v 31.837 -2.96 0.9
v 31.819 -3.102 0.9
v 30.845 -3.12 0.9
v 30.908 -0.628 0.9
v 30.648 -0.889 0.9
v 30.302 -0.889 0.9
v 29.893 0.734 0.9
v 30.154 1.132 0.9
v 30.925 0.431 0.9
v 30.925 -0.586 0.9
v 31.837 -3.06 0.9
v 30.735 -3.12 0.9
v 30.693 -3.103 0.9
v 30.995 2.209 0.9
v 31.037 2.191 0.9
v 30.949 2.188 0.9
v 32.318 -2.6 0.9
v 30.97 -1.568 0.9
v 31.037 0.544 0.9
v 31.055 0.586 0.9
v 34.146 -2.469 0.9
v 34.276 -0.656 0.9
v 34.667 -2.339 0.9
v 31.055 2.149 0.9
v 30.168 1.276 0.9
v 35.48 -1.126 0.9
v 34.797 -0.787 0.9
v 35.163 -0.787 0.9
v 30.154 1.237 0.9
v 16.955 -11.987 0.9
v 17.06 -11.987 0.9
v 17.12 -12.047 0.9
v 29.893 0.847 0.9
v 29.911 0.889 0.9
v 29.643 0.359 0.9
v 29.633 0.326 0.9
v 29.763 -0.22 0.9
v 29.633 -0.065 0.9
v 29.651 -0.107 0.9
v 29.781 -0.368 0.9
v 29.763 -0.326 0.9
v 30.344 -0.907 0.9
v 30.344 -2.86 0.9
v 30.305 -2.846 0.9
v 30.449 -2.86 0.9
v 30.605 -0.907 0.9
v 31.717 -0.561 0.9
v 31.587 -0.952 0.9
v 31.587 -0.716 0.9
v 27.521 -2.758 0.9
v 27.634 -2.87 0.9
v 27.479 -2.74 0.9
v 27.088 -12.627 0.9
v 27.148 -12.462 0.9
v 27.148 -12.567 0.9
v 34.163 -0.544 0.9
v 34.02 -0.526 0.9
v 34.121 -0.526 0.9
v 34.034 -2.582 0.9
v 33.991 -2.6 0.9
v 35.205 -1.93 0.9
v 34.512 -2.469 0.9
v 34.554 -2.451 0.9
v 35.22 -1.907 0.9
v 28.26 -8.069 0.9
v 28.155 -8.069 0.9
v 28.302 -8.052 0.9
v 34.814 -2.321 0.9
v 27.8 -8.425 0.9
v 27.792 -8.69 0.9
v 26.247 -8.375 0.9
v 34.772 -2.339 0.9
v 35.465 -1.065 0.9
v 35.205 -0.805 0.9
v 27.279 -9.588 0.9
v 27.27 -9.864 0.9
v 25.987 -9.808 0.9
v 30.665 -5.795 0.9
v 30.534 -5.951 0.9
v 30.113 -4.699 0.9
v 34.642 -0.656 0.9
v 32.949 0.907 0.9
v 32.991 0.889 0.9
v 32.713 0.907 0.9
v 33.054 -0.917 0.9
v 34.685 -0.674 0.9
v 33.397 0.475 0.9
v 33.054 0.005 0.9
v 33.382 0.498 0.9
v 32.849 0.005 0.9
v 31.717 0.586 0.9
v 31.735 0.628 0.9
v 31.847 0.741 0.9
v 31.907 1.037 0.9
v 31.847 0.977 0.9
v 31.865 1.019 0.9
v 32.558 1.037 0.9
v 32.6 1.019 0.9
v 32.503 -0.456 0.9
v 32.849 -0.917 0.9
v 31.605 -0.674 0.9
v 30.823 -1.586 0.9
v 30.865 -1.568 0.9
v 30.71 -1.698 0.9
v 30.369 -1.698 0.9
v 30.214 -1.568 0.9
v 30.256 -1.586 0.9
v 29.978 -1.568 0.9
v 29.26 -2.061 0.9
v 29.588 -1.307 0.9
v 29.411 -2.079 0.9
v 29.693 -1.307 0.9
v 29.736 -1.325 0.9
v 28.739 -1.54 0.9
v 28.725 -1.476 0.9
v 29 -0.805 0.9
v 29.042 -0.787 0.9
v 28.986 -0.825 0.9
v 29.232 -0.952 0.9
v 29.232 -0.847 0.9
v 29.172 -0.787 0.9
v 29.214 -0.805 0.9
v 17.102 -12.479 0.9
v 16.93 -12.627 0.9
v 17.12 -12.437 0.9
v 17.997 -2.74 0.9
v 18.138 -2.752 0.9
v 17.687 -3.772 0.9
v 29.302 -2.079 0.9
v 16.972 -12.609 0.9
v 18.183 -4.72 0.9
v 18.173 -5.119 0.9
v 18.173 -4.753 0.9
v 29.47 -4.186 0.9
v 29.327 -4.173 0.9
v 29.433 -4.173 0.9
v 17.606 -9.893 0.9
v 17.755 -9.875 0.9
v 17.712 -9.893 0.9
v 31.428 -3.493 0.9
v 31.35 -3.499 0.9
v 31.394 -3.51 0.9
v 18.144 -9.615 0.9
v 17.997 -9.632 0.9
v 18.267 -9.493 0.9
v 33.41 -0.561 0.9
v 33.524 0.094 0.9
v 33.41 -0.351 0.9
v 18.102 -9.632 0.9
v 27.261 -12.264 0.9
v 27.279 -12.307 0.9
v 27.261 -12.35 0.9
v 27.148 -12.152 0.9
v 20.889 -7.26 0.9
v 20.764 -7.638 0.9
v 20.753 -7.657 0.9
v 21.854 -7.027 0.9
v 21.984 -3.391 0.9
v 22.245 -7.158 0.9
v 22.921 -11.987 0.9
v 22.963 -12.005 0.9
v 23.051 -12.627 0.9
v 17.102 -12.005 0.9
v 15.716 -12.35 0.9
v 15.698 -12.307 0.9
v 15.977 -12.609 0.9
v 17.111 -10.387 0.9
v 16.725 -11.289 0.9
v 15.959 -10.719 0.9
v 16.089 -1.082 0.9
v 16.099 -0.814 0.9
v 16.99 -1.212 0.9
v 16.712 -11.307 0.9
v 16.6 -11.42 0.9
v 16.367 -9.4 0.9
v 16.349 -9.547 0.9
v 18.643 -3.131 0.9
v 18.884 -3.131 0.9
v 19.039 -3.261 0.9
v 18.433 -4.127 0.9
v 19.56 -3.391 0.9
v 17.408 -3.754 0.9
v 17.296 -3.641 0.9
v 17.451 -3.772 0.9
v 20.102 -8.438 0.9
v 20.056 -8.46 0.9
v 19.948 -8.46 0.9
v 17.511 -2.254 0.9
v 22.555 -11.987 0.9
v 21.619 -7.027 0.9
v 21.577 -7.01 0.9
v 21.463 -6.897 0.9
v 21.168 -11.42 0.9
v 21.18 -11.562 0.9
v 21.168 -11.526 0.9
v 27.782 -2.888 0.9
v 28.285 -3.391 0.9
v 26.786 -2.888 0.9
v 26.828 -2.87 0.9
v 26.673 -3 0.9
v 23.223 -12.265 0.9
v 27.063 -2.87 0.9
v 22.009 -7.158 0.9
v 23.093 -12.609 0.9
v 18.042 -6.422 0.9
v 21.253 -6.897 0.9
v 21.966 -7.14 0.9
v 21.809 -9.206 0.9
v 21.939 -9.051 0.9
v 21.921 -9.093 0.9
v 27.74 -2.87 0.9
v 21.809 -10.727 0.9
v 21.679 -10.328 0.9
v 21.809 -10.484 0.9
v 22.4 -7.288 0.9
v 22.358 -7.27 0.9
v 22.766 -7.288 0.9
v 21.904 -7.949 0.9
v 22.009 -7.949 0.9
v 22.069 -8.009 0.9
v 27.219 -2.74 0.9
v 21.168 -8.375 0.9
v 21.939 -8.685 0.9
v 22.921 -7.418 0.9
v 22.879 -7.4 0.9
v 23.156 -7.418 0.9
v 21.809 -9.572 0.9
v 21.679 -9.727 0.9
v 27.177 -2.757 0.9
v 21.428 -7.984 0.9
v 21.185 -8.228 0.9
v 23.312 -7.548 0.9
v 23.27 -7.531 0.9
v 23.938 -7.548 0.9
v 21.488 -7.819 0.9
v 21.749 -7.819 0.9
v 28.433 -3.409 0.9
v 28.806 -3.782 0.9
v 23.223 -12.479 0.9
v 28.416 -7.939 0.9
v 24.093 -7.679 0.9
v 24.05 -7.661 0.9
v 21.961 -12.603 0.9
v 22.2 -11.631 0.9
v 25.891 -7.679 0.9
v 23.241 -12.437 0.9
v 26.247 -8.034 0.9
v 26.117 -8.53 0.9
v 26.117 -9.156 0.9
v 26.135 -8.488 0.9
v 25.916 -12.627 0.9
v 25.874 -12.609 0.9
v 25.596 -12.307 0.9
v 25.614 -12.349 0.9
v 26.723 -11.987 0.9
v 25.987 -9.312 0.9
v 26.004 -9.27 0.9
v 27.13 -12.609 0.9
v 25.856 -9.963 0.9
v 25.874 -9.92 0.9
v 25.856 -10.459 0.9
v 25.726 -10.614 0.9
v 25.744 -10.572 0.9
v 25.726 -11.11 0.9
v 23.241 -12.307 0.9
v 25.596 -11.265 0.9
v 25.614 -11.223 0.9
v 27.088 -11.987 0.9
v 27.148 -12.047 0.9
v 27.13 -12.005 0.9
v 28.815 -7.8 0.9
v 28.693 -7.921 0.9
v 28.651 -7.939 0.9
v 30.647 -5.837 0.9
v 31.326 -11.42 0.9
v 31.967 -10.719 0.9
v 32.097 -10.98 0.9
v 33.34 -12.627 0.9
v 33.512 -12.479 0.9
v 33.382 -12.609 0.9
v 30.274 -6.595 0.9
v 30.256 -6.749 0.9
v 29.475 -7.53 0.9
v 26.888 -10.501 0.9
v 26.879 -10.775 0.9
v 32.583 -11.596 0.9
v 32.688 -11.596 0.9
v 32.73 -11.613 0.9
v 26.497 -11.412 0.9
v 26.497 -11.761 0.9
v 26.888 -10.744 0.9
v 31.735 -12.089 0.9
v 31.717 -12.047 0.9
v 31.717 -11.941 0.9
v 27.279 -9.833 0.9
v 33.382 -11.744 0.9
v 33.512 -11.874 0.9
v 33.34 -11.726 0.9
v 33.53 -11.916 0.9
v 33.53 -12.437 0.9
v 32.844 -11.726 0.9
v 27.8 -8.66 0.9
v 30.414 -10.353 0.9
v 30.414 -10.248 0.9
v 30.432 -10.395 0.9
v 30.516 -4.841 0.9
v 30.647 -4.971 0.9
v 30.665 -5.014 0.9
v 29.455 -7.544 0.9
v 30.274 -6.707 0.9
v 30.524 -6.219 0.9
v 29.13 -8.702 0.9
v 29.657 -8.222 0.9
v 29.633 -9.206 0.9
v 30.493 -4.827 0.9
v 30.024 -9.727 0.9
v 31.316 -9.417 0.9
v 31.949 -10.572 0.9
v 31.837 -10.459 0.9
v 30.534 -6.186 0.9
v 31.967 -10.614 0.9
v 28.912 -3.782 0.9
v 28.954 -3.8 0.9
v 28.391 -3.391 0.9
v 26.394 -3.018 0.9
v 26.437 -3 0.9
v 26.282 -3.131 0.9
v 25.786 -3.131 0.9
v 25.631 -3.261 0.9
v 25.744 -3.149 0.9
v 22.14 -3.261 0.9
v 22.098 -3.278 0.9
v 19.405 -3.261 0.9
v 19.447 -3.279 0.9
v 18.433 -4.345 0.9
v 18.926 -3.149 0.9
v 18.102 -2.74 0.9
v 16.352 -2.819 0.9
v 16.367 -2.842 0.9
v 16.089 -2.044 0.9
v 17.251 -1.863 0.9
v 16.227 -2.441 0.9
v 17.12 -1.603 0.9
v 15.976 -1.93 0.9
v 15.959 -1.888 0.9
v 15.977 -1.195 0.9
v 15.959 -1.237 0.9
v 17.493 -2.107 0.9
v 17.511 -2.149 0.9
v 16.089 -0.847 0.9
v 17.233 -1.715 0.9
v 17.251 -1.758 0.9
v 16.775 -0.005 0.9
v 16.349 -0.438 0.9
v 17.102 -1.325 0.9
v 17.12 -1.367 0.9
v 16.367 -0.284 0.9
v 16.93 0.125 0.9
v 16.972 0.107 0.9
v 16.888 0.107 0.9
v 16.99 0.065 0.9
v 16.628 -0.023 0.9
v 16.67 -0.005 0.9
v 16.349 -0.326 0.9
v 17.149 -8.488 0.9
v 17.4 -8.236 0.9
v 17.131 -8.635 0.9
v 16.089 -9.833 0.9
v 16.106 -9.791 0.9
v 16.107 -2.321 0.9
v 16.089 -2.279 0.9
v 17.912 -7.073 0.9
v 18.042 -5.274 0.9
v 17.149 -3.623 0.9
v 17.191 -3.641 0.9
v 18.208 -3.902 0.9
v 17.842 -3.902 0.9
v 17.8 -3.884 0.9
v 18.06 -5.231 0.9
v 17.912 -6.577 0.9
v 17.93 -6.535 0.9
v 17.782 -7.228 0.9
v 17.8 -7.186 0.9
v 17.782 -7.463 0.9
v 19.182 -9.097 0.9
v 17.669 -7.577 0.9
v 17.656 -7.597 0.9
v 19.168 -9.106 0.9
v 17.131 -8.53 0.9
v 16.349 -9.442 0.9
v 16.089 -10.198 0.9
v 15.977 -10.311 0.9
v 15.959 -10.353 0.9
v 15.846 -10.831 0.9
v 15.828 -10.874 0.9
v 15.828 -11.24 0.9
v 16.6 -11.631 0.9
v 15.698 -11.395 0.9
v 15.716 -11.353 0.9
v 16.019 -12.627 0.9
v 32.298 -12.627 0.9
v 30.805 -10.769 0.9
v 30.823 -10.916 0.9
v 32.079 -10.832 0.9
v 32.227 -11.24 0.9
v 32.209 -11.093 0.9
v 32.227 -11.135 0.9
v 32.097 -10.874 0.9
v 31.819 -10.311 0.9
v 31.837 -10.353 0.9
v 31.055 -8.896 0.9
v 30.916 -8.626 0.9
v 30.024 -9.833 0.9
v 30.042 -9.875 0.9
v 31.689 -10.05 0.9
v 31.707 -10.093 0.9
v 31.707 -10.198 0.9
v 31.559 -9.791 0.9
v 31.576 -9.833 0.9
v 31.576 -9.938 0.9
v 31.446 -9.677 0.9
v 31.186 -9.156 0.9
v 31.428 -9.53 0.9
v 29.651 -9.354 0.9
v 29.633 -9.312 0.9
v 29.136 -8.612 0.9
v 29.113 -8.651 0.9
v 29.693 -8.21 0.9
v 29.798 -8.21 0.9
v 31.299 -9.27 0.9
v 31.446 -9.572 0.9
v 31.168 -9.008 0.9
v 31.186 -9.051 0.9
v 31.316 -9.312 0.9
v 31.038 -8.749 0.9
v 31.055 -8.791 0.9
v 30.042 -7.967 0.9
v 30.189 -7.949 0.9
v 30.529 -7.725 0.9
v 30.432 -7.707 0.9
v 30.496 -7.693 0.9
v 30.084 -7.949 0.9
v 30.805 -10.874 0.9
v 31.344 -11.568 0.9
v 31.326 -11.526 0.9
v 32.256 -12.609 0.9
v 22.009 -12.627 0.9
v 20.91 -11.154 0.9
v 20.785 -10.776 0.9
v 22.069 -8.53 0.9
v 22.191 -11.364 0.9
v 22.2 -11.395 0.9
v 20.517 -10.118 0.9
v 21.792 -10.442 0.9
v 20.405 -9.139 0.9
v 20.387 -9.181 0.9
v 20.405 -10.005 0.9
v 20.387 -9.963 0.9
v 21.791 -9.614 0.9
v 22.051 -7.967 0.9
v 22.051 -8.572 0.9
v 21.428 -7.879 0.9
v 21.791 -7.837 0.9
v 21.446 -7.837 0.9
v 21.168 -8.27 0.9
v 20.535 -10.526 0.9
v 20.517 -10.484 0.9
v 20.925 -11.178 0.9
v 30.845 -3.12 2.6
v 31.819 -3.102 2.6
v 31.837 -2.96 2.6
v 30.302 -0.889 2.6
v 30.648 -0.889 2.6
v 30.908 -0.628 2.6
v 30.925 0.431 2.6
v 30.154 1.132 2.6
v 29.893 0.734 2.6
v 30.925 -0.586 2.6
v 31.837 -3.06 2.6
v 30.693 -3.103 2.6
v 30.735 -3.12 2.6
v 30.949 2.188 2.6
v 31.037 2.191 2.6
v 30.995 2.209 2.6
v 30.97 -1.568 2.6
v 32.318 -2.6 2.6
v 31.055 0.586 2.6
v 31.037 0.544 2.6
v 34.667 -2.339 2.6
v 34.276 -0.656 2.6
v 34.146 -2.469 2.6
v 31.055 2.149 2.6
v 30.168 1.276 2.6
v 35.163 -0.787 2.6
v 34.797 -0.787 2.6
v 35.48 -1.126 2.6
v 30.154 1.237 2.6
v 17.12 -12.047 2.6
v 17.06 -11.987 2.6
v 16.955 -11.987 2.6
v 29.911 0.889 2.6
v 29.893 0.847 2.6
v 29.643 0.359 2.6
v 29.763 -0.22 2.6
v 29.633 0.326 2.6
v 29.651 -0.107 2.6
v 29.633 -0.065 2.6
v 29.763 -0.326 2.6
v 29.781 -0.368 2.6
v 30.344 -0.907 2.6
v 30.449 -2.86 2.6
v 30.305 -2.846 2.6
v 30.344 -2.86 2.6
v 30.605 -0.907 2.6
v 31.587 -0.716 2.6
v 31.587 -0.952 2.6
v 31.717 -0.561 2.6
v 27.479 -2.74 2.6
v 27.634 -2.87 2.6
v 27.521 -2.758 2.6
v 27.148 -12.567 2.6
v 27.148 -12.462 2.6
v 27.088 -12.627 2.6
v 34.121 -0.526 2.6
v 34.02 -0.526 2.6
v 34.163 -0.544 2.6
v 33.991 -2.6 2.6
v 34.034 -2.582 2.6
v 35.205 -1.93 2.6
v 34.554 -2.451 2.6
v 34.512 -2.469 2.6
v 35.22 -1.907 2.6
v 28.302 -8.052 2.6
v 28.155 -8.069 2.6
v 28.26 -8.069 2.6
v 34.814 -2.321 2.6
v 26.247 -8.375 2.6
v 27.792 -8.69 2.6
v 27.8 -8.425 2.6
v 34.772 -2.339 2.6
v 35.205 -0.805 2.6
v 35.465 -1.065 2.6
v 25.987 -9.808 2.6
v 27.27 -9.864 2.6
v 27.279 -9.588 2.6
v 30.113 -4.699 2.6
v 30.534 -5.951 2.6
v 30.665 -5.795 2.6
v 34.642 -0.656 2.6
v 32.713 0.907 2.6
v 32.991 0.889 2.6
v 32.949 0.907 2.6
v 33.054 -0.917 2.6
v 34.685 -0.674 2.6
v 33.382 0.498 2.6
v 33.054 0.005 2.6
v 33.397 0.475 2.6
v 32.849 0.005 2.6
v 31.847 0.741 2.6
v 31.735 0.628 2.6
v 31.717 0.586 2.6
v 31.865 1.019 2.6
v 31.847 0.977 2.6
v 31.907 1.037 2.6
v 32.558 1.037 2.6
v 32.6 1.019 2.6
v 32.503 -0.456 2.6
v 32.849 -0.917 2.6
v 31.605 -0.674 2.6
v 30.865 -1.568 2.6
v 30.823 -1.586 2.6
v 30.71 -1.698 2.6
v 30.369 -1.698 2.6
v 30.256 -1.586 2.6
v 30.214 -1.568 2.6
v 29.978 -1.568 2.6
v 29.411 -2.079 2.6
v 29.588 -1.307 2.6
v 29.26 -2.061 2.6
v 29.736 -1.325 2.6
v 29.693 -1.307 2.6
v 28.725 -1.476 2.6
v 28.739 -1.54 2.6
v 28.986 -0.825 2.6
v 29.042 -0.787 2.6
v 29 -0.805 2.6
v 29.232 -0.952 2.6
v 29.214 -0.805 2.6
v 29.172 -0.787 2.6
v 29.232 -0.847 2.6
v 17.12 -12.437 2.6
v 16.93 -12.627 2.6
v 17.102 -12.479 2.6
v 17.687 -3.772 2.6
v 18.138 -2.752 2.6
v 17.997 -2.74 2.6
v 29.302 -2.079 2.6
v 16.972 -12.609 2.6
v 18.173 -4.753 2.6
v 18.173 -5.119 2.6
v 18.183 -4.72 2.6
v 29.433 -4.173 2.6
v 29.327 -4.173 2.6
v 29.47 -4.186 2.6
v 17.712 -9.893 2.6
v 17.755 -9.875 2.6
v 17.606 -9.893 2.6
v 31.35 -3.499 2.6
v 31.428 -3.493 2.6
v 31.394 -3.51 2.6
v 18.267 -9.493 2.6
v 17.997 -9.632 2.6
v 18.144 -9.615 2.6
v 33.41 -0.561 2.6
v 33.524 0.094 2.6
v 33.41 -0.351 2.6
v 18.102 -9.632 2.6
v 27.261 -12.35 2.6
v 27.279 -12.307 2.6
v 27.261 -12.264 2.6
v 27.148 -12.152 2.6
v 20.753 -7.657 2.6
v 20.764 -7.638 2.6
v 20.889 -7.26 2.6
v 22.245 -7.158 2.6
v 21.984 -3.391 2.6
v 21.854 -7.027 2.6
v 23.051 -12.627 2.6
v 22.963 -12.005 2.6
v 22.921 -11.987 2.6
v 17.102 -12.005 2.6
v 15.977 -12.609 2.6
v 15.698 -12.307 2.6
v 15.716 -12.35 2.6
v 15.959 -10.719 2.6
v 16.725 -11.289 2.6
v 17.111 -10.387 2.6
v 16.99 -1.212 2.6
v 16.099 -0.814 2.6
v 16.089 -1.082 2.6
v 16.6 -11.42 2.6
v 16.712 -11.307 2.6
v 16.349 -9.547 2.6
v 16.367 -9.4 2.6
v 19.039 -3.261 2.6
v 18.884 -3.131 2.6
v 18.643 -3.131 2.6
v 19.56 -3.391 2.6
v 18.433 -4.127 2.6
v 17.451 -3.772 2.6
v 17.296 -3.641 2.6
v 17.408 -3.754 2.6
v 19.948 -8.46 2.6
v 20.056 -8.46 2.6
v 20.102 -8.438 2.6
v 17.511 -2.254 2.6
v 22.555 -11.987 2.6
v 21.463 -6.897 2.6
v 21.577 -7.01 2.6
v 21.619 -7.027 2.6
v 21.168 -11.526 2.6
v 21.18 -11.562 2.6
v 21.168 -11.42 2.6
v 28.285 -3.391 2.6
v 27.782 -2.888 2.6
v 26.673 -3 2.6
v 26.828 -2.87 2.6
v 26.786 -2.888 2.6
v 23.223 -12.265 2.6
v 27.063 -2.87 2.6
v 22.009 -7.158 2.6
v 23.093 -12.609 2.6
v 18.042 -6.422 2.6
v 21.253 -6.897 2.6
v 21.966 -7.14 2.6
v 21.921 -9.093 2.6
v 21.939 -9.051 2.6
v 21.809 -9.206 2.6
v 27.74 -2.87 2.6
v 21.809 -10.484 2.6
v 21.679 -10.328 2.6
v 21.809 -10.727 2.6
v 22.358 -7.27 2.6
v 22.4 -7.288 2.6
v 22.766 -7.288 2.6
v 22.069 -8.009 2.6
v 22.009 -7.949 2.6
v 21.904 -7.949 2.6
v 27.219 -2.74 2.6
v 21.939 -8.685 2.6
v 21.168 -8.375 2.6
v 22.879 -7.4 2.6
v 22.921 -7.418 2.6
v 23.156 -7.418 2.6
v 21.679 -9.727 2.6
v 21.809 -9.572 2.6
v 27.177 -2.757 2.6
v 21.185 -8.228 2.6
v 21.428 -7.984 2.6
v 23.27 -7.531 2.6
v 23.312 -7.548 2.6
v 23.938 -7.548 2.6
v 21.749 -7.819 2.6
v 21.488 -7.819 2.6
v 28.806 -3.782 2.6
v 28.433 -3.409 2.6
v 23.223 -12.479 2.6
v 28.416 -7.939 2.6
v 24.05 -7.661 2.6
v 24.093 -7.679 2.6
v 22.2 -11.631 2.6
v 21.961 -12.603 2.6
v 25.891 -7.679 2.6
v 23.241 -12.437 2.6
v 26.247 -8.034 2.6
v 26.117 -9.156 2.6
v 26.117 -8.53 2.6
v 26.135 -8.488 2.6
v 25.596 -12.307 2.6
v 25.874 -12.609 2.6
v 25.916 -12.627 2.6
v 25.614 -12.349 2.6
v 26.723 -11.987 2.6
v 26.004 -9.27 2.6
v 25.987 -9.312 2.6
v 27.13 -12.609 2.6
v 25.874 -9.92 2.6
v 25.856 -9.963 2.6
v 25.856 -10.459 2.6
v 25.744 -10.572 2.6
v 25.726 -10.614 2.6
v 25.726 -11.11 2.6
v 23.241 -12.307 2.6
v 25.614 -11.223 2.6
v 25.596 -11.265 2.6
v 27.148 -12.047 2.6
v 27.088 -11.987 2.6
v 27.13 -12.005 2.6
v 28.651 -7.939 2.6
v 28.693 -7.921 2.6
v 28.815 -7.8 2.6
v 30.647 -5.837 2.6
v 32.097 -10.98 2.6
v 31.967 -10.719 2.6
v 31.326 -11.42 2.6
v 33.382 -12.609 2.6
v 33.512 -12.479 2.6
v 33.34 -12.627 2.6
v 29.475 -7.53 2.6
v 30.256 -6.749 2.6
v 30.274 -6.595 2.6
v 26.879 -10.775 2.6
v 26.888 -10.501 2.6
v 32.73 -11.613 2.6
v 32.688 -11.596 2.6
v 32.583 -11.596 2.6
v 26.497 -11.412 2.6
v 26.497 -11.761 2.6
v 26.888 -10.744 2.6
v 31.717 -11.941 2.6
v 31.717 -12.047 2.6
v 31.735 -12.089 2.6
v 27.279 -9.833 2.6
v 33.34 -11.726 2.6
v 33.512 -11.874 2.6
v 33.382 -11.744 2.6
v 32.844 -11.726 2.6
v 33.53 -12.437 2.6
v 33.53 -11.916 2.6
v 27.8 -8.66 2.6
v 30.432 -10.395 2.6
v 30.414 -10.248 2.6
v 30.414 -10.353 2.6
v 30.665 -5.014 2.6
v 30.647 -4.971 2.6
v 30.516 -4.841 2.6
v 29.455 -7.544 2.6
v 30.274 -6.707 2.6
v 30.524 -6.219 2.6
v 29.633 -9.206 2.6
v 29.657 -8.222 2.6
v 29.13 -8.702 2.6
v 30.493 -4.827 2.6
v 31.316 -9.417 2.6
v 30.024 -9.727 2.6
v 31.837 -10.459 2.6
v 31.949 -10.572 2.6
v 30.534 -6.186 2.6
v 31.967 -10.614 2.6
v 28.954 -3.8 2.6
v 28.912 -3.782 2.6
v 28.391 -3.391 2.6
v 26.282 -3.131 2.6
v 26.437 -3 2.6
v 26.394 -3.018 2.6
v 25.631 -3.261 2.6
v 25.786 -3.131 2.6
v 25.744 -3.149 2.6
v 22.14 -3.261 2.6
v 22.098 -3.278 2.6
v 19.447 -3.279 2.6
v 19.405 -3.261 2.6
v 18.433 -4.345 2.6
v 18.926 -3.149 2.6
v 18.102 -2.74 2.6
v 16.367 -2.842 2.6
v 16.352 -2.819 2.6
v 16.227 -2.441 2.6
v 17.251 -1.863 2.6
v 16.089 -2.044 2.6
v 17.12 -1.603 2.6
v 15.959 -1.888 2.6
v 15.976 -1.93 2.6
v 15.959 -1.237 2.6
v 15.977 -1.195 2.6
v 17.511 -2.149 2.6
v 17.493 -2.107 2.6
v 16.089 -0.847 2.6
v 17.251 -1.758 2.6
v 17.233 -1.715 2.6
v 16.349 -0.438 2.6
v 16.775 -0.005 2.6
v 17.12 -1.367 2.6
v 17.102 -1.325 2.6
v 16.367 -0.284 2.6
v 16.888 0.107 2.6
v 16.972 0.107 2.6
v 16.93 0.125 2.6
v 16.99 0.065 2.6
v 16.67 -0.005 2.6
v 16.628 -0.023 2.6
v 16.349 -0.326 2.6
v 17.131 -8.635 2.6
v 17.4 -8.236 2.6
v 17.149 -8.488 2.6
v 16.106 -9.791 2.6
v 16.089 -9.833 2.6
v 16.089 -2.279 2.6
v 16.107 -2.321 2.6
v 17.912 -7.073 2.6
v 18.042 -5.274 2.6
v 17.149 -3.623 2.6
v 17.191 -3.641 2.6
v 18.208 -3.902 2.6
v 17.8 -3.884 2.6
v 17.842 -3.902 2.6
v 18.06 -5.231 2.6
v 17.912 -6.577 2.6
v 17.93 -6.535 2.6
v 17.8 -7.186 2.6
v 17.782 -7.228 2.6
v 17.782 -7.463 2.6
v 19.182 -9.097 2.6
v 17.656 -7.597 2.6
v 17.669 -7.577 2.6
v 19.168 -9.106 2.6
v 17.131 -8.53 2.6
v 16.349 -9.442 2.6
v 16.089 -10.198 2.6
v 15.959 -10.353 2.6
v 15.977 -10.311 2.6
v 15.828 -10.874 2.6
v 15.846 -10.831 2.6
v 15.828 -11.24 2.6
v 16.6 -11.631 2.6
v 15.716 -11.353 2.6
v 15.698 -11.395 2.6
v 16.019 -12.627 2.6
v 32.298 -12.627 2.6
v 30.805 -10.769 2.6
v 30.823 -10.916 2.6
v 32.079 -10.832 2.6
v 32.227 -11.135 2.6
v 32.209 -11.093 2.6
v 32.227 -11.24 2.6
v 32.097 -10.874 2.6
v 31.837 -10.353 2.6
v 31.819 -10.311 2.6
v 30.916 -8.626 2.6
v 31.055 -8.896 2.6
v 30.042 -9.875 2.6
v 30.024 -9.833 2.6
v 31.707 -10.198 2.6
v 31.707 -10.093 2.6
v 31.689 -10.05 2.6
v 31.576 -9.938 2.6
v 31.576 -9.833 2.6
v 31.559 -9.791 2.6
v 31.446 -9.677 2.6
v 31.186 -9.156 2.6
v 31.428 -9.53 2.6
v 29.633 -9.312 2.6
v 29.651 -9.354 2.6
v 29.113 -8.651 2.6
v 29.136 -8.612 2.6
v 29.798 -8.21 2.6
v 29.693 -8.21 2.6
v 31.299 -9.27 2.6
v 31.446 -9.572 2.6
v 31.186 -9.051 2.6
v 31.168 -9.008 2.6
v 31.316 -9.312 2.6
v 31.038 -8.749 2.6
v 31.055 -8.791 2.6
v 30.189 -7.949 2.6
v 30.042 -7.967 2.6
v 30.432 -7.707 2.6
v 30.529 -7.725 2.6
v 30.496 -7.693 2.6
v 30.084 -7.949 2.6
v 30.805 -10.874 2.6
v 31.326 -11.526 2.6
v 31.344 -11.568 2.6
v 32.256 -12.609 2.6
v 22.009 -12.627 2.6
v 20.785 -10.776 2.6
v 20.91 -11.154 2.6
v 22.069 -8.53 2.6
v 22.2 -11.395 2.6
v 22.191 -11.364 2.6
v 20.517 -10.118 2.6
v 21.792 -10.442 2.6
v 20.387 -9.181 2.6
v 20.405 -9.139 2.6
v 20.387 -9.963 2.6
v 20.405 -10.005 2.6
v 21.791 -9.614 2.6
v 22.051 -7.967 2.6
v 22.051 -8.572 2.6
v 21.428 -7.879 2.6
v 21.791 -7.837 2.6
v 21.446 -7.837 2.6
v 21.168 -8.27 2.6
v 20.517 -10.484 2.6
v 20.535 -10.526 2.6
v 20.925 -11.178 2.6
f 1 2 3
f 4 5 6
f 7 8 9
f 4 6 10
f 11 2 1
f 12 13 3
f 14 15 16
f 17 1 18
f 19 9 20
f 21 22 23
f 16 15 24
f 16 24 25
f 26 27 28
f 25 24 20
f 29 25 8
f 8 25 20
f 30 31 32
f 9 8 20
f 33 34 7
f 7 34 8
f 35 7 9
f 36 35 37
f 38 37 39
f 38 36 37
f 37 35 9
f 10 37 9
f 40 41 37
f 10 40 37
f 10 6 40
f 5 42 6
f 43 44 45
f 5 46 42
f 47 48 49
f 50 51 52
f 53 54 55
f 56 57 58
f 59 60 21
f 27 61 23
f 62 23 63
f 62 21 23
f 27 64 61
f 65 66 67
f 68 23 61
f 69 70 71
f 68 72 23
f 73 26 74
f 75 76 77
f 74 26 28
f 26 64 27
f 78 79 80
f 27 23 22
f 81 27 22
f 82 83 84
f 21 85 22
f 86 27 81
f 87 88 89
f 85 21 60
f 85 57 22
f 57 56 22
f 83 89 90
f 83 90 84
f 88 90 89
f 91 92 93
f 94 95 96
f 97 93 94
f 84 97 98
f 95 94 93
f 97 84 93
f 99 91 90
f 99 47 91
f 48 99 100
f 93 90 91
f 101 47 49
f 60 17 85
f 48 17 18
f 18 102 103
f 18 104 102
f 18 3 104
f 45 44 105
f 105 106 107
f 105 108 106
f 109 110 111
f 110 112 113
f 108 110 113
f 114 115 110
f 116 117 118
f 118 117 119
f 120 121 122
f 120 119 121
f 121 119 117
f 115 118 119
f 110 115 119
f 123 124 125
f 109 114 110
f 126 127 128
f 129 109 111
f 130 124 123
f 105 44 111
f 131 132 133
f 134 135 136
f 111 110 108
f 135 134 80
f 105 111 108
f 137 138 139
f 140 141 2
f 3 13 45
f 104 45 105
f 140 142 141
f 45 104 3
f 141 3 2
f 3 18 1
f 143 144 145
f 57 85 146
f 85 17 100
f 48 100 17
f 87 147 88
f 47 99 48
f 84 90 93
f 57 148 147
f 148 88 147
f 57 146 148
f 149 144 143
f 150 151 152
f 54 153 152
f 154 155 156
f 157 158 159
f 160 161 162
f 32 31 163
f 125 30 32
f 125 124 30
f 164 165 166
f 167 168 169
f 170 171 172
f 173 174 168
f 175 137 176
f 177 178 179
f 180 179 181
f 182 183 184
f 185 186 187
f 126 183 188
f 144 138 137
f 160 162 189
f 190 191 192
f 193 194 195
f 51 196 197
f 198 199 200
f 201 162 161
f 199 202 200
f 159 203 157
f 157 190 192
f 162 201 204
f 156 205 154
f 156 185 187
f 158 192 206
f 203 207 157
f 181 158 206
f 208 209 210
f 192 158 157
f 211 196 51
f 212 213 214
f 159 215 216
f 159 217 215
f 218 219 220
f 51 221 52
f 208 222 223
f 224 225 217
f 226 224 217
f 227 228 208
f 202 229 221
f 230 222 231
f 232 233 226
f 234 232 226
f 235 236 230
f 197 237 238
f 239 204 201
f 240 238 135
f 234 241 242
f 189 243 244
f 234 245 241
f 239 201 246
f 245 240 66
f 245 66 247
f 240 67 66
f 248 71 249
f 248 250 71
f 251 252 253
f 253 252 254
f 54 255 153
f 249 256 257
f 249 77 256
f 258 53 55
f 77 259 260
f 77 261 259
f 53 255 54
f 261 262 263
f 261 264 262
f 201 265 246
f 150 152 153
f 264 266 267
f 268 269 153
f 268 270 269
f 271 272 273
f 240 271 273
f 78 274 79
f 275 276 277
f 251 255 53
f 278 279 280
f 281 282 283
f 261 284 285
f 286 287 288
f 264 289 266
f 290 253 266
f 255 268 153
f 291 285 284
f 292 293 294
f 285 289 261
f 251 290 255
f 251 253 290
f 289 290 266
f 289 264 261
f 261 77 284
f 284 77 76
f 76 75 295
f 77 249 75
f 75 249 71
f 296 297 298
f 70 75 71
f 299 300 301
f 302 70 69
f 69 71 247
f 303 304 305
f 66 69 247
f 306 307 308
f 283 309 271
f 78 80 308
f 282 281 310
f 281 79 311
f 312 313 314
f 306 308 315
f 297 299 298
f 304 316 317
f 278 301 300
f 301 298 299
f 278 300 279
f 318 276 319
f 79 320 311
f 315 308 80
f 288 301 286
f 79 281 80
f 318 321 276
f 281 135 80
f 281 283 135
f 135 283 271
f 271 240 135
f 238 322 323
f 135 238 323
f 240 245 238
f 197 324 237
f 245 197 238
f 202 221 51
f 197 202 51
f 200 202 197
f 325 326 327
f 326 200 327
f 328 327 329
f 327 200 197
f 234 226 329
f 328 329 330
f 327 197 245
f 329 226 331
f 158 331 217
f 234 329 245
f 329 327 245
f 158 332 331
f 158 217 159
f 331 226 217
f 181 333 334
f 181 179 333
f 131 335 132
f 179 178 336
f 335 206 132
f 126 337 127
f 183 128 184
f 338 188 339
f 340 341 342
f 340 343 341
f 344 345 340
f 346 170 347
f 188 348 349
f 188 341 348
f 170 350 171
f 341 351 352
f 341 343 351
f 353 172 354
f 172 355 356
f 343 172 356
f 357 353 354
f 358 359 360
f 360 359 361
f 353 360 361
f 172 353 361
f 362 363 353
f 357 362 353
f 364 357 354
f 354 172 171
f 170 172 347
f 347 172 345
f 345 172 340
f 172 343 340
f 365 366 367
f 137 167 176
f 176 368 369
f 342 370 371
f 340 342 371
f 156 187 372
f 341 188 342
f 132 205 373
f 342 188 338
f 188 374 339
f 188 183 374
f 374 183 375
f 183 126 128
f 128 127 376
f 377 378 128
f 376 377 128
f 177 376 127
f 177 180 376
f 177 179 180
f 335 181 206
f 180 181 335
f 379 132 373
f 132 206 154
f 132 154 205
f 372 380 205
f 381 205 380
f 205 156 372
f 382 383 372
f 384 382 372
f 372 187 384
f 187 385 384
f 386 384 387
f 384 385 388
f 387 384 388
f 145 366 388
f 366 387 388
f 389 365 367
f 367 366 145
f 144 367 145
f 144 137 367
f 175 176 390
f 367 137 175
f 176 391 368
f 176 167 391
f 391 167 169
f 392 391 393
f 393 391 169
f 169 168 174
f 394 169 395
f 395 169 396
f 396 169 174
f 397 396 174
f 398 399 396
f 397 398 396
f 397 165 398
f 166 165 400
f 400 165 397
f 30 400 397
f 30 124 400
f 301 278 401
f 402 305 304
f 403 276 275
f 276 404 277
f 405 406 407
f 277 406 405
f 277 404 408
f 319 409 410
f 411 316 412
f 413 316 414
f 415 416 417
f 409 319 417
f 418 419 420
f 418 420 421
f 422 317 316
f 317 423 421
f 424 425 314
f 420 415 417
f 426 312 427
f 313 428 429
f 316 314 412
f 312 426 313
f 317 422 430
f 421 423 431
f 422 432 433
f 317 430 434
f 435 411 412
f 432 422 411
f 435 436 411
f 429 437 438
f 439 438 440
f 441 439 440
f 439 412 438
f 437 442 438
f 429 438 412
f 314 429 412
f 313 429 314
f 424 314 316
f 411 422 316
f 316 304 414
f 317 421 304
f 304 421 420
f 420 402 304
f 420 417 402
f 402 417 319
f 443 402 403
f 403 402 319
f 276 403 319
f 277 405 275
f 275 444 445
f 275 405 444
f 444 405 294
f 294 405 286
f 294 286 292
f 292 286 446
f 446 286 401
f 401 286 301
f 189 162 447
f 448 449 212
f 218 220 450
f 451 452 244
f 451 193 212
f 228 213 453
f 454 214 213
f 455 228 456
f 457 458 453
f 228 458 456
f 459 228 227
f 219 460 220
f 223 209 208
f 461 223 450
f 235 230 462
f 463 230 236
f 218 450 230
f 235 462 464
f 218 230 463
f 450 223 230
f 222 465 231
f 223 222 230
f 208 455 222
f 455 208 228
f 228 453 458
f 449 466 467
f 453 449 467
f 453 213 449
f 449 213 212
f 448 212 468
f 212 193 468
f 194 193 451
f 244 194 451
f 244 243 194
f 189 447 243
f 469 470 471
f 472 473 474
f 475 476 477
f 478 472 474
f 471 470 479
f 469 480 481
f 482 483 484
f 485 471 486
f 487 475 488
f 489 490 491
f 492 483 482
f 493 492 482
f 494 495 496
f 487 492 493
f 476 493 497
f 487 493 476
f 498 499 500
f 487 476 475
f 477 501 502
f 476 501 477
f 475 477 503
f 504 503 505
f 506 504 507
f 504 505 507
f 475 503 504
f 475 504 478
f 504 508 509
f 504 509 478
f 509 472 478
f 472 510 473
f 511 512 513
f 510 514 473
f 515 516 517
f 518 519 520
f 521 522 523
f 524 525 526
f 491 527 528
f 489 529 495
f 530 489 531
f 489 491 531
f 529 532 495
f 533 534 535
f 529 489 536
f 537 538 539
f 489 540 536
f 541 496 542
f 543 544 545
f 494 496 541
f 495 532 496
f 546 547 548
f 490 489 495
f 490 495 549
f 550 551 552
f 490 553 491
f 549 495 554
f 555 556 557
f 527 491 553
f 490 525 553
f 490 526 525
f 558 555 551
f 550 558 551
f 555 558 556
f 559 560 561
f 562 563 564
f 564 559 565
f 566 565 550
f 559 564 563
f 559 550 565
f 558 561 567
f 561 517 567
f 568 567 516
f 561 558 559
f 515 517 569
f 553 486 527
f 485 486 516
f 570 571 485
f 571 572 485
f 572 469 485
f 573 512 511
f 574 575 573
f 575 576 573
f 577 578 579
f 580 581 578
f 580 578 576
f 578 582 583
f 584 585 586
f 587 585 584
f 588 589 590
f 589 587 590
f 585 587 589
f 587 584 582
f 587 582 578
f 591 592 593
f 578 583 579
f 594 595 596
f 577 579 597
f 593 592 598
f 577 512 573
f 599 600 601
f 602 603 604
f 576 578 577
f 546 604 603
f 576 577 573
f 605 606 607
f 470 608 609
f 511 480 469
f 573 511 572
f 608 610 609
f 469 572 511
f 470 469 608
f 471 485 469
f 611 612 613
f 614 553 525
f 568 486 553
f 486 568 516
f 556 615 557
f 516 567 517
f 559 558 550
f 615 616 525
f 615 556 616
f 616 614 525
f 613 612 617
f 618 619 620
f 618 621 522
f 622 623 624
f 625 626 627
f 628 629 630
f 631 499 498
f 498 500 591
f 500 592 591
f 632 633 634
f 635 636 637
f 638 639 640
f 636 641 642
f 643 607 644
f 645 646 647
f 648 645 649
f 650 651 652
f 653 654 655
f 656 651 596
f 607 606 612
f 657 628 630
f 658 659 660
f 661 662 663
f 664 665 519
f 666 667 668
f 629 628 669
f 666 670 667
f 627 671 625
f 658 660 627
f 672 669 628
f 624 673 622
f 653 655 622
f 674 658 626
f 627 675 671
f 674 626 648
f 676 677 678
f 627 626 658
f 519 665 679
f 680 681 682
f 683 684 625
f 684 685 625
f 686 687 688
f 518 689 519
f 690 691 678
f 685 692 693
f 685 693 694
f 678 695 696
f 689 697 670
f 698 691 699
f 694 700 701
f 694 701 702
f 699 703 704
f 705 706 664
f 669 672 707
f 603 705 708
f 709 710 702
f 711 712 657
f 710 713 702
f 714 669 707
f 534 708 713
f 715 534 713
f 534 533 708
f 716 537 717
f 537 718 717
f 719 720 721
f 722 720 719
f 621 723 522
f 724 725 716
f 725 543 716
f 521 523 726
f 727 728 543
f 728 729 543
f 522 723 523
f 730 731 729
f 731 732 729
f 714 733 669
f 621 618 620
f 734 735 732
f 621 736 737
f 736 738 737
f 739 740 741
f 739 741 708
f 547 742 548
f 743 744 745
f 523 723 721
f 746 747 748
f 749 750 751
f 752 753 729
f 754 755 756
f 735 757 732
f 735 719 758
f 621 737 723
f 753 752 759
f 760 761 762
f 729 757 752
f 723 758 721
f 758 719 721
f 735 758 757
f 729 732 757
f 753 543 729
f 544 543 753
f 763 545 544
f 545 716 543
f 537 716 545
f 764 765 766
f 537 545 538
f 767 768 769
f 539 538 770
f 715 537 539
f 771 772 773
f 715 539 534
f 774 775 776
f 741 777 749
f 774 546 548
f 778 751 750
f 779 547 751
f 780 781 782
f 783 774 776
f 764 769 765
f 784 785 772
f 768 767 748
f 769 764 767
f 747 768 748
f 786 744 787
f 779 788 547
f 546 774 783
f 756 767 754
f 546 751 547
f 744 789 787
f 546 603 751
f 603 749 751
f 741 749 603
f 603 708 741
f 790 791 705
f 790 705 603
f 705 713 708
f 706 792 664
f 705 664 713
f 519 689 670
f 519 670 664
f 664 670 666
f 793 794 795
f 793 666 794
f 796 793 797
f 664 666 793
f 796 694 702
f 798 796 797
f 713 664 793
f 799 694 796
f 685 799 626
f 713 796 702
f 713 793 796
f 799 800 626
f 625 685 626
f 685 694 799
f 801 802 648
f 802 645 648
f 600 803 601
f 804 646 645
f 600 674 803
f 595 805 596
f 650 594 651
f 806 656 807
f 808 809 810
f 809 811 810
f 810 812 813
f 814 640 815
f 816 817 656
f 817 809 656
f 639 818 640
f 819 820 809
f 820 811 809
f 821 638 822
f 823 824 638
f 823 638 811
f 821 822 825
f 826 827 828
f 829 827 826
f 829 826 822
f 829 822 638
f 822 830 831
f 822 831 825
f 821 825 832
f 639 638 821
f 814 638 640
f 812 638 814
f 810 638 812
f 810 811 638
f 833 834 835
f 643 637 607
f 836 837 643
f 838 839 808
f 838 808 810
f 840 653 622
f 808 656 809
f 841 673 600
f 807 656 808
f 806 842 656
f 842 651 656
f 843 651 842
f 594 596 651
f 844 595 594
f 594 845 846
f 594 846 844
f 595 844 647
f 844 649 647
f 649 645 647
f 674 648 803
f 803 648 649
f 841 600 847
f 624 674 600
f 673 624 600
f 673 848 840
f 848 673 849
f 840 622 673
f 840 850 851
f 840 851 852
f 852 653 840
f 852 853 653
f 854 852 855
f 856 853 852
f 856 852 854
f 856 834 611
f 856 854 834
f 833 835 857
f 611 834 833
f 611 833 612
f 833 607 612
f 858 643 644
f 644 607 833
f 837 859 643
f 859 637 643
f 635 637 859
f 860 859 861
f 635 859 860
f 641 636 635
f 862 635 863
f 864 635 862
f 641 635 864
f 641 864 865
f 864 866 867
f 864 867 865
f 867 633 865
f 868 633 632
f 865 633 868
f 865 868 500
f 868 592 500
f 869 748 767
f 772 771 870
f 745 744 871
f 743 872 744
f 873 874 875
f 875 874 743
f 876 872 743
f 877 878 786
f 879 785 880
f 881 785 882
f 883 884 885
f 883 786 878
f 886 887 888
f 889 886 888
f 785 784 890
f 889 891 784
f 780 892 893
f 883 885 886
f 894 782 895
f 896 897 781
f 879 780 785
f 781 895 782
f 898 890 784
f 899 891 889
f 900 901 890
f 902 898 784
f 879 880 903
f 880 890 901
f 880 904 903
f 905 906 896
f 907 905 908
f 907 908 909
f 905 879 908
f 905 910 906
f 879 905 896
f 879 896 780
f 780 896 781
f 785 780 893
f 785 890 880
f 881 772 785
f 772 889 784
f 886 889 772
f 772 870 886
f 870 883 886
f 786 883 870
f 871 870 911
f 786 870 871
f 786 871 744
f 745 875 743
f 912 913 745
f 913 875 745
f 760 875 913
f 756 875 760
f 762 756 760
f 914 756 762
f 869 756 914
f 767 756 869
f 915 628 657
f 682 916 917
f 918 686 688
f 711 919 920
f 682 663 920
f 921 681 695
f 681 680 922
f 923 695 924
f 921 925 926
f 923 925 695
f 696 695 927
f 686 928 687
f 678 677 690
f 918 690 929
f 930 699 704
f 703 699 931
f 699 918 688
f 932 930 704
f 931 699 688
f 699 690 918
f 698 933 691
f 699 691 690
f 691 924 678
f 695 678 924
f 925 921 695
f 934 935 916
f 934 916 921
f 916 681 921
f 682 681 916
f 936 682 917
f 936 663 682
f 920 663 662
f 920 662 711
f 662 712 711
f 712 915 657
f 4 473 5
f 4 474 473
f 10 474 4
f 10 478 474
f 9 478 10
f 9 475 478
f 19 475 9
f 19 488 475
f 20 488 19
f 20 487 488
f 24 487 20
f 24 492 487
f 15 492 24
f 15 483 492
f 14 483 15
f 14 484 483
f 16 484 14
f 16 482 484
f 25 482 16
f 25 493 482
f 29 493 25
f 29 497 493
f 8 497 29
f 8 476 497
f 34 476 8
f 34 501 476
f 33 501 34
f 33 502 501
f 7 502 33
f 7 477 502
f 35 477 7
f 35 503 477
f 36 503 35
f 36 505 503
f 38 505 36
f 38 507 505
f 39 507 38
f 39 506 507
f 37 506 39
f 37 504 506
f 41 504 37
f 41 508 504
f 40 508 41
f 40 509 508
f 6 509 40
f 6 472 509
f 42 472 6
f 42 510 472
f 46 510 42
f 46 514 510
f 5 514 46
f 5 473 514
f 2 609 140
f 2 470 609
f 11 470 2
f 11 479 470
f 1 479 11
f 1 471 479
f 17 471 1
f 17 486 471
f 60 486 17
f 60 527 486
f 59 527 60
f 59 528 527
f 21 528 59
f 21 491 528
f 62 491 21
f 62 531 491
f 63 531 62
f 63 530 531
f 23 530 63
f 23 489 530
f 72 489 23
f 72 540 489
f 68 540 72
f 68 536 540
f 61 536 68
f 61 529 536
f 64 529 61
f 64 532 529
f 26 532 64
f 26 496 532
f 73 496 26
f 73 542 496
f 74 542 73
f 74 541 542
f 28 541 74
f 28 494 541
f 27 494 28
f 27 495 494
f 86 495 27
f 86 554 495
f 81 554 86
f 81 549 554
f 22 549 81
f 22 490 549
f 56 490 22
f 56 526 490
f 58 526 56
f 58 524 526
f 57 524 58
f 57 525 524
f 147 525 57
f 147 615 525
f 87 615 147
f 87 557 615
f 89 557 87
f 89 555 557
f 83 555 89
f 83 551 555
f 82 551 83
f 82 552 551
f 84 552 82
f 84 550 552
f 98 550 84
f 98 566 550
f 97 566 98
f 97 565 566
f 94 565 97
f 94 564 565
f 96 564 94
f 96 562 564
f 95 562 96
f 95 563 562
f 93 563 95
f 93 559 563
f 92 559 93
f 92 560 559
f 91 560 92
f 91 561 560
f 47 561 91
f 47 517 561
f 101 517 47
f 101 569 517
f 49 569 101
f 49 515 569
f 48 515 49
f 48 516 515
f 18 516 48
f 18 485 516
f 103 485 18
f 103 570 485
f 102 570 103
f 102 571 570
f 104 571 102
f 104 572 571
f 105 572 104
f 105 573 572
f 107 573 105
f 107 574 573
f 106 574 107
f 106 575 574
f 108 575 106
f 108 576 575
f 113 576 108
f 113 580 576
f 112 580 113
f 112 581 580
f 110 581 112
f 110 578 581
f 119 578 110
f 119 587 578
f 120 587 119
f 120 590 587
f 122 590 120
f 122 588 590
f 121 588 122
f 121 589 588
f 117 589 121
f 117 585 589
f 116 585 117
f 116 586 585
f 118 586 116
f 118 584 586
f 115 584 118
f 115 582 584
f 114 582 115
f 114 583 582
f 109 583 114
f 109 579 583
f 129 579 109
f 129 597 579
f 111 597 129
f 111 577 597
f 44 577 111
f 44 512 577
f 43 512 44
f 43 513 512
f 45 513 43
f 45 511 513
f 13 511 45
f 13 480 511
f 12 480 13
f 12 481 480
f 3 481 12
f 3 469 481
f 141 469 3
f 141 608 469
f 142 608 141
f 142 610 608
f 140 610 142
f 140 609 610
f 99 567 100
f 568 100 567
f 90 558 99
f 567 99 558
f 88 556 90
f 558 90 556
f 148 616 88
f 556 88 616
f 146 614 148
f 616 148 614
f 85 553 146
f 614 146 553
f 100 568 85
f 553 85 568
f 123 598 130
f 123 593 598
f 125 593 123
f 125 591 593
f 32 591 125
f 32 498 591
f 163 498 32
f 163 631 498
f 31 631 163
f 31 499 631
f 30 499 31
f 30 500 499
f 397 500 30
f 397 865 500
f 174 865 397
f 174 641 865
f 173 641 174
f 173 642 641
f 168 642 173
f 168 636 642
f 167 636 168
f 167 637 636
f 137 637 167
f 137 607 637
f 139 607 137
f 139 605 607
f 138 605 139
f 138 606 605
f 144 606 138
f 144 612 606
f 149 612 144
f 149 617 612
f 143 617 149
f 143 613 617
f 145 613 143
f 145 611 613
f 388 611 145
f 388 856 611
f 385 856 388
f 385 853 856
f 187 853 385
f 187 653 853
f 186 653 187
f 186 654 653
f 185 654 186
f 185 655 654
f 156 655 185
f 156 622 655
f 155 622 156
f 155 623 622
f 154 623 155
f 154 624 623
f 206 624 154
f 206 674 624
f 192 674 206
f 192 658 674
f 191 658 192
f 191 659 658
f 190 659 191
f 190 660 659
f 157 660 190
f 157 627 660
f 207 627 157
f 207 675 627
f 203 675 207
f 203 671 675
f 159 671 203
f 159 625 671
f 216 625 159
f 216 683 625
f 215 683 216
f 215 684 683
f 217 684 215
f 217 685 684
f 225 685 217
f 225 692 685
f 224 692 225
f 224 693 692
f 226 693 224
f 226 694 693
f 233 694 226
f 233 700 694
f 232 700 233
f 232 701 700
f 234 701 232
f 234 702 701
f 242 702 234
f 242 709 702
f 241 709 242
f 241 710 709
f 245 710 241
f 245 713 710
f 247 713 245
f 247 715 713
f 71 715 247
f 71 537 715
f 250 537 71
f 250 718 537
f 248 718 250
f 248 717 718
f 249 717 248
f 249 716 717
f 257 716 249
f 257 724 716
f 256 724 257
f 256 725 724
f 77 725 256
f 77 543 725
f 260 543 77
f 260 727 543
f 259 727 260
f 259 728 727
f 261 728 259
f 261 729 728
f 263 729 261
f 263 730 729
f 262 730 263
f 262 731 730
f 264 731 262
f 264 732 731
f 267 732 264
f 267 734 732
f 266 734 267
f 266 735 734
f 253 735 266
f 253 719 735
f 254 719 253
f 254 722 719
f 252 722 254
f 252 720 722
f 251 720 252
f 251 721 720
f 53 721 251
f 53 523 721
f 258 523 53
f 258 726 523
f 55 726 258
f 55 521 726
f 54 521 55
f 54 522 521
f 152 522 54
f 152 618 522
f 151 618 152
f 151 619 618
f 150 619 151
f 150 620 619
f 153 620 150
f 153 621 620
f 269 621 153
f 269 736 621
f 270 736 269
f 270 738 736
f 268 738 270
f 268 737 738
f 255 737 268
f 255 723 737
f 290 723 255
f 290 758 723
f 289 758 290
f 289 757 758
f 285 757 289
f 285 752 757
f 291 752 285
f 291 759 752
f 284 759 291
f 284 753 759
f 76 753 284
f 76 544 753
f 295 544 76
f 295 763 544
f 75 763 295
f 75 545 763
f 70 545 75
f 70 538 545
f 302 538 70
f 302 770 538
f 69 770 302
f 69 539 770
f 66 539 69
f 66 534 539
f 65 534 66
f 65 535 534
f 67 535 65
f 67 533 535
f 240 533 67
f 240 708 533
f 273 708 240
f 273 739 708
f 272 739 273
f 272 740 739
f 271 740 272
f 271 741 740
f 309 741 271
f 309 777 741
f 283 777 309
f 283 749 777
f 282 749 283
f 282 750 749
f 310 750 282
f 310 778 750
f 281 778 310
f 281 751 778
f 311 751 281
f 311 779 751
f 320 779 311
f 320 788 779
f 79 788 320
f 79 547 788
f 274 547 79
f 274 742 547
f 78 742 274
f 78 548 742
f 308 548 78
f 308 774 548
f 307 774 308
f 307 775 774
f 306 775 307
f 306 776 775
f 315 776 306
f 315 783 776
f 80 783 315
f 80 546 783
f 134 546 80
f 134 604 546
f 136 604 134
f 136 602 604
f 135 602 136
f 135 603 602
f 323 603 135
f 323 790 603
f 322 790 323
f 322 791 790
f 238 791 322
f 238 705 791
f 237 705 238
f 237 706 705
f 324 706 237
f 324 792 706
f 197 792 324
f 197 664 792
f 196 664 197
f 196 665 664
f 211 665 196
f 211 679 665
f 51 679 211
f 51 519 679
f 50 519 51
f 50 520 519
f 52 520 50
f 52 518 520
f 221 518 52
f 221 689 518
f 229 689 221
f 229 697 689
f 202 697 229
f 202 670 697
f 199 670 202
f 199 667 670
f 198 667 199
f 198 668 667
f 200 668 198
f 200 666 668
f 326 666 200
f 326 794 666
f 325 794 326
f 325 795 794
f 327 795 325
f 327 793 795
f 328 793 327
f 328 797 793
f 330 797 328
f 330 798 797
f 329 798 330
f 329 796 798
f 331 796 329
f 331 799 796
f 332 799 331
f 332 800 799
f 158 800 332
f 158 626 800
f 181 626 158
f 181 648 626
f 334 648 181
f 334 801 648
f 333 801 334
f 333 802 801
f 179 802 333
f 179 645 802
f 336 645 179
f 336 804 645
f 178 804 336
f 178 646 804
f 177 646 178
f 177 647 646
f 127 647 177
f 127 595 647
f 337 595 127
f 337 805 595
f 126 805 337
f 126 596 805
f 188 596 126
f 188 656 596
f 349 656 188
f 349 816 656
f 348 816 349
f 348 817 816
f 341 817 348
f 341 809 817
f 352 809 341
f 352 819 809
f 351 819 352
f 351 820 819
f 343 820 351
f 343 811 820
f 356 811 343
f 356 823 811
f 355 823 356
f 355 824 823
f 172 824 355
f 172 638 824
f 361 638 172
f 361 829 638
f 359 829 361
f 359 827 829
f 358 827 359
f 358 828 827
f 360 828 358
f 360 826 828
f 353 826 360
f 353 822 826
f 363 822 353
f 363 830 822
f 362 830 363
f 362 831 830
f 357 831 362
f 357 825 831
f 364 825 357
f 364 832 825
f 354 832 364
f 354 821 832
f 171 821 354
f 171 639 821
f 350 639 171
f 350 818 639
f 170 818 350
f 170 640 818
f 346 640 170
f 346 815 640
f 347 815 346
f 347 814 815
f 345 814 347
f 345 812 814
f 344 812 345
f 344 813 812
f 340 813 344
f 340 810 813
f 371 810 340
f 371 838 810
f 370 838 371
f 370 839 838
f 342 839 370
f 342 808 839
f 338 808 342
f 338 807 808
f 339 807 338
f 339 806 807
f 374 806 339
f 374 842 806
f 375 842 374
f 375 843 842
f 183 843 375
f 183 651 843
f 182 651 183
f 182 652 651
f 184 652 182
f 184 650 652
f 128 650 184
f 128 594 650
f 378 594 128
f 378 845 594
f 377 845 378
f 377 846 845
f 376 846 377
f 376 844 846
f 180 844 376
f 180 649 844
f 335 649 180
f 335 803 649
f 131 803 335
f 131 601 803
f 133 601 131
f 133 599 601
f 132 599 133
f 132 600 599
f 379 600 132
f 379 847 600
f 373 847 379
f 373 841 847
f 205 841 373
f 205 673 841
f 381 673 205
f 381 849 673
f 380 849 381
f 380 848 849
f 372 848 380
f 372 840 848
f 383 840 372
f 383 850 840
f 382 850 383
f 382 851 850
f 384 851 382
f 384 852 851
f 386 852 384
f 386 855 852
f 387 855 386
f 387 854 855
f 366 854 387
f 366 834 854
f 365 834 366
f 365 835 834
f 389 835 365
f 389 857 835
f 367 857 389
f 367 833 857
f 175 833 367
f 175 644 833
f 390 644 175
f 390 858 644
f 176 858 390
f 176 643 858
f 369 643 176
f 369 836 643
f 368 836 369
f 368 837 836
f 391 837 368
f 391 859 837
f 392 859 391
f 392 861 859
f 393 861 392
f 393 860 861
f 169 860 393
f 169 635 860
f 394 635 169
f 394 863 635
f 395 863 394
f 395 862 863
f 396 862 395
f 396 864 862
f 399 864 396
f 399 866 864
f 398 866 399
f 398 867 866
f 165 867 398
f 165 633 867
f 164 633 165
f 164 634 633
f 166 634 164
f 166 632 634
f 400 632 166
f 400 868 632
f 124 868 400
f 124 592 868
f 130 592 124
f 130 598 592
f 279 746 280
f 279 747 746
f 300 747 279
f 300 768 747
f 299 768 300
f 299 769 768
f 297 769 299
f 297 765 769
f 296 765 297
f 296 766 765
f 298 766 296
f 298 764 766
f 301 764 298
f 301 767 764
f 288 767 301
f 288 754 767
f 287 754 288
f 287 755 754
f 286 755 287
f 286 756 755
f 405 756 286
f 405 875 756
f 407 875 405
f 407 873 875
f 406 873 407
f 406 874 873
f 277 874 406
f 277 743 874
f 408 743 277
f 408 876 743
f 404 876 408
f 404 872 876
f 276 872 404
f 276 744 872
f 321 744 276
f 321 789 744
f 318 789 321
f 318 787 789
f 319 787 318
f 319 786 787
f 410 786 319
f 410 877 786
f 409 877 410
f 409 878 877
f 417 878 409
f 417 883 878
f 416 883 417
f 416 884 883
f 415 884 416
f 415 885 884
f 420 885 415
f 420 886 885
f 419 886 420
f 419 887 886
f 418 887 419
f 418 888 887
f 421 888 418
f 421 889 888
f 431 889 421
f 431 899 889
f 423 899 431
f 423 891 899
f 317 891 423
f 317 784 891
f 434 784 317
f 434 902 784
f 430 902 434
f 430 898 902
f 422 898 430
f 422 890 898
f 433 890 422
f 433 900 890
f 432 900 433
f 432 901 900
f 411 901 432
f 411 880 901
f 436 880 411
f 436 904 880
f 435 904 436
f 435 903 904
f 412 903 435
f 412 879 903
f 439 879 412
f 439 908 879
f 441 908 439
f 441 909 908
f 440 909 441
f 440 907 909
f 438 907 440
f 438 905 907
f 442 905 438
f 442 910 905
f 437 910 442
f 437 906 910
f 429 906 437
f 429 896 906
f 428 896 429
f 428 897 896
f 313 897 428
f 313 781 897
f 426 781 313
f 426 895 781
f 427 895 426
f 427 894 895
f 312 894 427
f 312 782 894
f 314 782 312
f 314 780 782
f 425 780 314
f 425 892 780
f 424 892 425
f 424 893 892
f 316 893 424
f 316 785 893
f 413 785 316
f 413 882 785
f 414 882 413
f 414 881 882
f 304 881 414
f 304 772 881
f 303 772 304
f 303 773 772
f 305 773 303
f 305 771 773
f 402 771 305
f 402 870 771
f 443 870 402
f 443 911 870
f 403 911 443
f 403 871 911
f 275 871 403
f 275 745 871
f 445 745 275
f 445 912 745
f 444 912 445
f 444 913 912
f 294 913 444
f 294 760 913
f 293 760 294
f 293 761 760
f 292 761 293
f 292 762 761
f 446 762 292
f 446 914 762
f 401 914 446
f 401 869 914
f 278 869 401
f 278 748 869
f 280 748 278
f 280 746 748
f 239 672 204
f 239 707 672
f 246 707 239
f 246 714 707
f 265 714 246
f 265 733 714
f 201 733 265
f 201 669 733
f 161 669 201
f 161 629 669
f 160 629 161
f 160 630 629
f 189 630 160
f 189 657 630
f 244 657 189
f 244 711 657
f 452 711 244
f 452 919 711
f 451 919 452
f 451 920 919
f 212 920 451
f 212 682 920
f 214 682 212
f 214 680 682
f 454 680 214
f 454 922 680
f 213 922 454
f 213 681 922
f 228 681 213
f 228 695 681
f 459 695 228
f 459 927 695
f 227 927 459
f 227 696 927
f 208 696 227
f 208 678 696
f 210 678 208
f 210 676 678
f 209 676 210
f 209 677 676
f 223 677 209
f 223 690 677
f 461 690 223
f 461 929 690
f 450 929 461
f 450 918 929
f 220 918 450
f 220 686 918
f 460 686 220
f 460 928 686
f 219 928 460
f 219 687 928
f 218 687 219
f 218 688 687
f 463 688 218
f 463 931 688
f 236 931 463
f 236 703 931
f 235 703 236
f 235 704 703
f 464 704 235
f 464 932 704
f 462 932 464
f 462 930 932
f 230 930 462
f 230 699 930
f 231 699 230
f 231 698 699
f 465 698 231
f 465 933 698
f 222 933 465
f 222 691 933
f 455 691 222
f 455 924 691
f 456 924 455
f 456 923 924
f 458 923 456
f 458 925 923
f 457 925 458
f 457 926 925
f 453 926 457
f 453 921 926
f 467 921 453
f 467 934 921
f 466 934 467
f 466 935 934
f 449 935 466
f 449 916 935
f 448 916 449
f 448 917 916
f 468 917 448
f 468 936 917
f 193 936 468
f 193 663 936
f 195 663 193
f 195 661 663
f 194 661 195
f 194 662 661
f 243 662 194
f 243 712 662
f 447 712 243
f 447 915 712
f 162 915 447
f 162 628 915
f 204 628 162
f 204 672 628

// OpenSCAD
$fn = 24;
translate([0, 0.000, 0.900])
  linear_extrude(height=1.700) {
offset(r=0.06, $fn=8) {
    polygon(points=[[21.488,-7.879],[21.488,-8.009],[21.228,-8.270],[21.228,-8.400],[20.447,-9.181],[20.447,-9.963],[20.577,-10.093],[20.577,-10.484],[20.837,-10.744],[20.967,-11.135],[21.228,-11.395],[21.228,-11.526],[22.009,-12.567],[23.051,-12.567],[23.181,-12.437],[23.181,-12.307],[22.921,-12.047],[22.530,-12.047],[22.140,-11.656],[22.140,-11.395],[21.749,-10.744],[21.749,-10.484],[21.619,-10.353],[21.619,-9.702],[21.749,-9.572],[21.749,-9.181],[21.879,-9.051],[21.879,-8.660],[22.009,-8.530],[22.009,-8.009],[21.879,-8.009],[21.749,-7.879]], paths=[[0,1,2,3,4,5,6,7,8,9,10,11,12,13,14,15,16,17,18,19,20,21,22,23,24,25,26,27,28,29,30,31]]);
    polygon(points=[[29.172,-8.660],[29.693,-9.181],[29.693,-9.312],[30.084,-9.702],[30.084,-9.833],[30.474,-10.223],[30.474,-10.353],[30.865,-10.744],[30.865,-10.874],[31.386,-11.395],[31.386,-11.526],[31.777,-11.916],[31.777,-12.047],[32.298,-12.567],[33.340,-12.567],[33.470,-12.437],[33.470,-11.916],[33.340,-11.786],[32.819,-11.786],[32.688,-11.656],[32.558,-11.656],[32.167,-11.265],[32.167,-11.135],[32.037,-11.005],[32.037,-10.874],[31.907,-10.744],[31.907,-10.614],[31.777,-10.484],[31.777,-10.353],[31.647,-10.223],[31.647,-10.093],[31.516,-9.963],[31.516,-9.833],[31.386,-9.702],[31.386,-9.572],[31.256,-9.442],[31.256,-9.312],[31.126,-9.181],[31.126,-9.051],[30.995,-8.921],[30.995,-8.791],[30.865,-8.660],[30.474,-7.749],[30.214,-8.009],[30.084,-8.009],[29.823,-8.270],[29.693,-8.270]], paths=[[0,1,2,3,4,5,6,7,8,9,10,11,12,13,14,15,16,17,18,19,20,21,22,23,24,25,26,27,28,29,30,31,32,33,34,35,36,37,38,39,40,41,42,43,44,45,46]]);
    polygon(points=[[16.670,-0.065],[16.409,-0.326],[16.409,-0.456],[16.149,-0.847],[16.149,-1.107],[16.019,-1.237],[16.019,-1.888],[16.149,-2.019],[16.149,-2.279],[16.279,-2.409],[16.409,-2.800],[17.191,-3.581],[17.321,-3.581],[17.451,-3.712],[17.712,-3.712],[17.842,-3.842],[18.233,-3.842],[18.493,-4.102],[18.493,-4.363],[18.233,-4.753],[18.233,-5.144],[18.102,-5.274],[18.102,-6.447],[17.972,-6.577],[17.972,-7.098],[17.842,-7.228],[17.842,-7.488],[17.712,-7.619],[17.451,-8.270],[17.191,-8.530],[17.191,-8.660],[16.409,-9.442],[16.409,-9.572],[16.149,-9.833],[16.149,-10.223],[16.019,-10.353],[16.019,-10.744],[15.888,-10.874],[15.888,-11.265],[15.758,-11.395],[15.758,-12.307],[16.019,-12.567],[16.930,-12.567],[17.060,-12.437],[17.060,-12.047],[16.930,-12.047],[16.540,-11.656],[16.540,-11.395],[16.670,-11.265],[17.060,-10.353],[17.581,-9.833],[17.712,-9.833],[17.972,-9.572],[18.102,-9.572],[18.233,-9.442],[19.144,-9.051],[19.926,-8.400],[20.056,-8.400],[20.707,-7.619],[20.837,-7.228],[21.228,-6.837],[21.488,-6.837],[21.619,-6.967],[21.879,-6.967],[22.009,-7.098],[22.270,-7.098],[22.400,-7.228],[22.791,-7.228],[22.921,-7.358],[23.181,-7.358],[23.312,-7.488],[23.963,-7.488],[24.093,-7.619],[25.916,-7.619],[26.307,-8.009],[26.307,-8.400],[26.177,-8.530],[26.177,-9.181],[26.047,-9.312],[26.047,-9.833],[25.916,-9.963],[25.916,-10.484],[25.786,-10.614],[25.786,-11.135],[25.656,-11.265],[25.656,-12.307],[25.916,-12.567],[27.088,-12.567],[27.088,-12.437],[27.219,-12.307],[27.088,-12.177],[27.088,-12.047],[26.698,-12.047],[26.437,-11.786],[26.437,-11.395],[26.828,-10.744],[26.828,-10.484],[27.219,-9.833],[27.219,-9.572],[27.740,-8.660],[27.740,-8.400],[28.130,-8.009],[28.260,-8.009],[28.391,-7.879],[28.651,-7.879],[28.781,-7.749],[29.433,-7.488],[30.214,-6.707],[30.214,-6.577],[30.474,-6.186],[30.474,-5.926],[30.605,-5.795],[30.605,-5.014],[30.474,-4.884],[30.084,-4.753],[29.433,-4.233],[29.302,-4.233],[28.912,-3.842],[28.781,-3.842],[28.391,-3.451],[28.260,-3.451],[27.740,-2.930],[27.609,-2.930],[27.479,-2.800],[27.219,-2.800],[27.088,-2.930],[26.828,-2.930],[26.698,-3.060],[26.437,-3.060],[26.307,-3.191],[25.786,-3.191],[25.656,-3.321],[22.140,-3.321],[22.009,-3.451],[19.535,-3.451],[19.405,-3.321],[19.014,-3.321],[18.884,-3.191],[18.623,-3.191],[18.102,-2.800],[17.972,-2.800],[17.451,-2.279],[17.451,-2.149],[17.191,-1.888],[17.191,-1.758],[17.060,-1.628],[17.060,-1.367],[16.930,-1.237],[16.930,0.065],[16.800,-0.065]], paths=[[0,1,2,3,4,5,6,7,8,9,10,11,12,13,14,15,16,17,18,19,20,21,22,23,24,25,26,27,28,29,30,31,32,33,34,35,36,37,38,39,40,41,42,43,44,45,46,47,48,49,50,51,52,53,54,55,56,57,58,59,60,61,62,63,64,65,66,67,68,69,70,71,72,73,74,75,76,77,78,79,80,81,82,83,84,85,86,87,88,89,90,91,92,93,94,95,96,97,98,99,100,101,102,103,104,105,106,107,108,109,110,111,112,113,114,115,116,117,118,119,120,121,122,123,124,125,126,127,128,129,130,131,132,133,134,135,136,137,138,139,140,141,142,143,144,145,146,147,148,149]]);
    polygon(points=[[35.423,-1.107],[35.163,-0.847],[34.772,-0.847],[34.642,-0.716],[34.251,-0.716],[34.121,-0.586],[33.991,-0.586],[33.470,0.065],[33.340,0.456],[32.949,0.847],[32.688,0.847],[32.558,0.977],[31.907,0.977],[31.907,0.716],[31.777,0.586],[31.777,-0.586],[31.647,-0.716],[31.647,-0.977],[30.995,-1.628],[30.865,-1.628],[30.735,-1.758],[30.344,-1.758],[30.214,-1.628],[29.953,-1.628],[29.693,-1.367],[29.563,-1.367],[29.172,-0.977],[29.172,-0.847],[29.042,-0.847],[28.781,-1.498],[29.302,-2.019],[29.433,-2.019],[30.344,-2.800],[30.474,-2.800],[30.735,-3.060],[30.865,-3.060],[31.386,-3.451],[31.777,-3.060],[31.777,-2.930],[32.298,-2.540],[33.991,-2.540],[34.121,-2.409],[34.512,-2.409],[34.642,-2.279],[34.772,-2.279],[35.163,-1.888],[32.819,0.065],[33.079,0.065],[33.470,-0.326],[33.470,-0.586],[33.079,-0.977],[32.819,-0.977],[32.428,-0.456]], paths=[[0,1,2,3,4,5,6,7,8,9,10,11,12,13,14,15,16,17,18,19,20,21,22,23,24,25,26,27,28,29,30,31,32,33,34,35,36,37,38,39,40,41,42,43,44,45],[46,47,48,49,50,51,52]]);
    polygon(points=[[30.995,2.149],[30.214,1.237],[30.214,1.107],[29.953,0.847],[29.953,0.716],[29.693,0.326],[29.693,-0.065],[29.823,-0.195],[29.823,-0.326],[30.344,-0.847],[30.605,-0.847],[30.865,-0.586],[30.865,0.456],[30.995,0.586]], paths=[[0,1,2,3,4,5,6,7,8,9,10,11,12,13]]);
}
}
